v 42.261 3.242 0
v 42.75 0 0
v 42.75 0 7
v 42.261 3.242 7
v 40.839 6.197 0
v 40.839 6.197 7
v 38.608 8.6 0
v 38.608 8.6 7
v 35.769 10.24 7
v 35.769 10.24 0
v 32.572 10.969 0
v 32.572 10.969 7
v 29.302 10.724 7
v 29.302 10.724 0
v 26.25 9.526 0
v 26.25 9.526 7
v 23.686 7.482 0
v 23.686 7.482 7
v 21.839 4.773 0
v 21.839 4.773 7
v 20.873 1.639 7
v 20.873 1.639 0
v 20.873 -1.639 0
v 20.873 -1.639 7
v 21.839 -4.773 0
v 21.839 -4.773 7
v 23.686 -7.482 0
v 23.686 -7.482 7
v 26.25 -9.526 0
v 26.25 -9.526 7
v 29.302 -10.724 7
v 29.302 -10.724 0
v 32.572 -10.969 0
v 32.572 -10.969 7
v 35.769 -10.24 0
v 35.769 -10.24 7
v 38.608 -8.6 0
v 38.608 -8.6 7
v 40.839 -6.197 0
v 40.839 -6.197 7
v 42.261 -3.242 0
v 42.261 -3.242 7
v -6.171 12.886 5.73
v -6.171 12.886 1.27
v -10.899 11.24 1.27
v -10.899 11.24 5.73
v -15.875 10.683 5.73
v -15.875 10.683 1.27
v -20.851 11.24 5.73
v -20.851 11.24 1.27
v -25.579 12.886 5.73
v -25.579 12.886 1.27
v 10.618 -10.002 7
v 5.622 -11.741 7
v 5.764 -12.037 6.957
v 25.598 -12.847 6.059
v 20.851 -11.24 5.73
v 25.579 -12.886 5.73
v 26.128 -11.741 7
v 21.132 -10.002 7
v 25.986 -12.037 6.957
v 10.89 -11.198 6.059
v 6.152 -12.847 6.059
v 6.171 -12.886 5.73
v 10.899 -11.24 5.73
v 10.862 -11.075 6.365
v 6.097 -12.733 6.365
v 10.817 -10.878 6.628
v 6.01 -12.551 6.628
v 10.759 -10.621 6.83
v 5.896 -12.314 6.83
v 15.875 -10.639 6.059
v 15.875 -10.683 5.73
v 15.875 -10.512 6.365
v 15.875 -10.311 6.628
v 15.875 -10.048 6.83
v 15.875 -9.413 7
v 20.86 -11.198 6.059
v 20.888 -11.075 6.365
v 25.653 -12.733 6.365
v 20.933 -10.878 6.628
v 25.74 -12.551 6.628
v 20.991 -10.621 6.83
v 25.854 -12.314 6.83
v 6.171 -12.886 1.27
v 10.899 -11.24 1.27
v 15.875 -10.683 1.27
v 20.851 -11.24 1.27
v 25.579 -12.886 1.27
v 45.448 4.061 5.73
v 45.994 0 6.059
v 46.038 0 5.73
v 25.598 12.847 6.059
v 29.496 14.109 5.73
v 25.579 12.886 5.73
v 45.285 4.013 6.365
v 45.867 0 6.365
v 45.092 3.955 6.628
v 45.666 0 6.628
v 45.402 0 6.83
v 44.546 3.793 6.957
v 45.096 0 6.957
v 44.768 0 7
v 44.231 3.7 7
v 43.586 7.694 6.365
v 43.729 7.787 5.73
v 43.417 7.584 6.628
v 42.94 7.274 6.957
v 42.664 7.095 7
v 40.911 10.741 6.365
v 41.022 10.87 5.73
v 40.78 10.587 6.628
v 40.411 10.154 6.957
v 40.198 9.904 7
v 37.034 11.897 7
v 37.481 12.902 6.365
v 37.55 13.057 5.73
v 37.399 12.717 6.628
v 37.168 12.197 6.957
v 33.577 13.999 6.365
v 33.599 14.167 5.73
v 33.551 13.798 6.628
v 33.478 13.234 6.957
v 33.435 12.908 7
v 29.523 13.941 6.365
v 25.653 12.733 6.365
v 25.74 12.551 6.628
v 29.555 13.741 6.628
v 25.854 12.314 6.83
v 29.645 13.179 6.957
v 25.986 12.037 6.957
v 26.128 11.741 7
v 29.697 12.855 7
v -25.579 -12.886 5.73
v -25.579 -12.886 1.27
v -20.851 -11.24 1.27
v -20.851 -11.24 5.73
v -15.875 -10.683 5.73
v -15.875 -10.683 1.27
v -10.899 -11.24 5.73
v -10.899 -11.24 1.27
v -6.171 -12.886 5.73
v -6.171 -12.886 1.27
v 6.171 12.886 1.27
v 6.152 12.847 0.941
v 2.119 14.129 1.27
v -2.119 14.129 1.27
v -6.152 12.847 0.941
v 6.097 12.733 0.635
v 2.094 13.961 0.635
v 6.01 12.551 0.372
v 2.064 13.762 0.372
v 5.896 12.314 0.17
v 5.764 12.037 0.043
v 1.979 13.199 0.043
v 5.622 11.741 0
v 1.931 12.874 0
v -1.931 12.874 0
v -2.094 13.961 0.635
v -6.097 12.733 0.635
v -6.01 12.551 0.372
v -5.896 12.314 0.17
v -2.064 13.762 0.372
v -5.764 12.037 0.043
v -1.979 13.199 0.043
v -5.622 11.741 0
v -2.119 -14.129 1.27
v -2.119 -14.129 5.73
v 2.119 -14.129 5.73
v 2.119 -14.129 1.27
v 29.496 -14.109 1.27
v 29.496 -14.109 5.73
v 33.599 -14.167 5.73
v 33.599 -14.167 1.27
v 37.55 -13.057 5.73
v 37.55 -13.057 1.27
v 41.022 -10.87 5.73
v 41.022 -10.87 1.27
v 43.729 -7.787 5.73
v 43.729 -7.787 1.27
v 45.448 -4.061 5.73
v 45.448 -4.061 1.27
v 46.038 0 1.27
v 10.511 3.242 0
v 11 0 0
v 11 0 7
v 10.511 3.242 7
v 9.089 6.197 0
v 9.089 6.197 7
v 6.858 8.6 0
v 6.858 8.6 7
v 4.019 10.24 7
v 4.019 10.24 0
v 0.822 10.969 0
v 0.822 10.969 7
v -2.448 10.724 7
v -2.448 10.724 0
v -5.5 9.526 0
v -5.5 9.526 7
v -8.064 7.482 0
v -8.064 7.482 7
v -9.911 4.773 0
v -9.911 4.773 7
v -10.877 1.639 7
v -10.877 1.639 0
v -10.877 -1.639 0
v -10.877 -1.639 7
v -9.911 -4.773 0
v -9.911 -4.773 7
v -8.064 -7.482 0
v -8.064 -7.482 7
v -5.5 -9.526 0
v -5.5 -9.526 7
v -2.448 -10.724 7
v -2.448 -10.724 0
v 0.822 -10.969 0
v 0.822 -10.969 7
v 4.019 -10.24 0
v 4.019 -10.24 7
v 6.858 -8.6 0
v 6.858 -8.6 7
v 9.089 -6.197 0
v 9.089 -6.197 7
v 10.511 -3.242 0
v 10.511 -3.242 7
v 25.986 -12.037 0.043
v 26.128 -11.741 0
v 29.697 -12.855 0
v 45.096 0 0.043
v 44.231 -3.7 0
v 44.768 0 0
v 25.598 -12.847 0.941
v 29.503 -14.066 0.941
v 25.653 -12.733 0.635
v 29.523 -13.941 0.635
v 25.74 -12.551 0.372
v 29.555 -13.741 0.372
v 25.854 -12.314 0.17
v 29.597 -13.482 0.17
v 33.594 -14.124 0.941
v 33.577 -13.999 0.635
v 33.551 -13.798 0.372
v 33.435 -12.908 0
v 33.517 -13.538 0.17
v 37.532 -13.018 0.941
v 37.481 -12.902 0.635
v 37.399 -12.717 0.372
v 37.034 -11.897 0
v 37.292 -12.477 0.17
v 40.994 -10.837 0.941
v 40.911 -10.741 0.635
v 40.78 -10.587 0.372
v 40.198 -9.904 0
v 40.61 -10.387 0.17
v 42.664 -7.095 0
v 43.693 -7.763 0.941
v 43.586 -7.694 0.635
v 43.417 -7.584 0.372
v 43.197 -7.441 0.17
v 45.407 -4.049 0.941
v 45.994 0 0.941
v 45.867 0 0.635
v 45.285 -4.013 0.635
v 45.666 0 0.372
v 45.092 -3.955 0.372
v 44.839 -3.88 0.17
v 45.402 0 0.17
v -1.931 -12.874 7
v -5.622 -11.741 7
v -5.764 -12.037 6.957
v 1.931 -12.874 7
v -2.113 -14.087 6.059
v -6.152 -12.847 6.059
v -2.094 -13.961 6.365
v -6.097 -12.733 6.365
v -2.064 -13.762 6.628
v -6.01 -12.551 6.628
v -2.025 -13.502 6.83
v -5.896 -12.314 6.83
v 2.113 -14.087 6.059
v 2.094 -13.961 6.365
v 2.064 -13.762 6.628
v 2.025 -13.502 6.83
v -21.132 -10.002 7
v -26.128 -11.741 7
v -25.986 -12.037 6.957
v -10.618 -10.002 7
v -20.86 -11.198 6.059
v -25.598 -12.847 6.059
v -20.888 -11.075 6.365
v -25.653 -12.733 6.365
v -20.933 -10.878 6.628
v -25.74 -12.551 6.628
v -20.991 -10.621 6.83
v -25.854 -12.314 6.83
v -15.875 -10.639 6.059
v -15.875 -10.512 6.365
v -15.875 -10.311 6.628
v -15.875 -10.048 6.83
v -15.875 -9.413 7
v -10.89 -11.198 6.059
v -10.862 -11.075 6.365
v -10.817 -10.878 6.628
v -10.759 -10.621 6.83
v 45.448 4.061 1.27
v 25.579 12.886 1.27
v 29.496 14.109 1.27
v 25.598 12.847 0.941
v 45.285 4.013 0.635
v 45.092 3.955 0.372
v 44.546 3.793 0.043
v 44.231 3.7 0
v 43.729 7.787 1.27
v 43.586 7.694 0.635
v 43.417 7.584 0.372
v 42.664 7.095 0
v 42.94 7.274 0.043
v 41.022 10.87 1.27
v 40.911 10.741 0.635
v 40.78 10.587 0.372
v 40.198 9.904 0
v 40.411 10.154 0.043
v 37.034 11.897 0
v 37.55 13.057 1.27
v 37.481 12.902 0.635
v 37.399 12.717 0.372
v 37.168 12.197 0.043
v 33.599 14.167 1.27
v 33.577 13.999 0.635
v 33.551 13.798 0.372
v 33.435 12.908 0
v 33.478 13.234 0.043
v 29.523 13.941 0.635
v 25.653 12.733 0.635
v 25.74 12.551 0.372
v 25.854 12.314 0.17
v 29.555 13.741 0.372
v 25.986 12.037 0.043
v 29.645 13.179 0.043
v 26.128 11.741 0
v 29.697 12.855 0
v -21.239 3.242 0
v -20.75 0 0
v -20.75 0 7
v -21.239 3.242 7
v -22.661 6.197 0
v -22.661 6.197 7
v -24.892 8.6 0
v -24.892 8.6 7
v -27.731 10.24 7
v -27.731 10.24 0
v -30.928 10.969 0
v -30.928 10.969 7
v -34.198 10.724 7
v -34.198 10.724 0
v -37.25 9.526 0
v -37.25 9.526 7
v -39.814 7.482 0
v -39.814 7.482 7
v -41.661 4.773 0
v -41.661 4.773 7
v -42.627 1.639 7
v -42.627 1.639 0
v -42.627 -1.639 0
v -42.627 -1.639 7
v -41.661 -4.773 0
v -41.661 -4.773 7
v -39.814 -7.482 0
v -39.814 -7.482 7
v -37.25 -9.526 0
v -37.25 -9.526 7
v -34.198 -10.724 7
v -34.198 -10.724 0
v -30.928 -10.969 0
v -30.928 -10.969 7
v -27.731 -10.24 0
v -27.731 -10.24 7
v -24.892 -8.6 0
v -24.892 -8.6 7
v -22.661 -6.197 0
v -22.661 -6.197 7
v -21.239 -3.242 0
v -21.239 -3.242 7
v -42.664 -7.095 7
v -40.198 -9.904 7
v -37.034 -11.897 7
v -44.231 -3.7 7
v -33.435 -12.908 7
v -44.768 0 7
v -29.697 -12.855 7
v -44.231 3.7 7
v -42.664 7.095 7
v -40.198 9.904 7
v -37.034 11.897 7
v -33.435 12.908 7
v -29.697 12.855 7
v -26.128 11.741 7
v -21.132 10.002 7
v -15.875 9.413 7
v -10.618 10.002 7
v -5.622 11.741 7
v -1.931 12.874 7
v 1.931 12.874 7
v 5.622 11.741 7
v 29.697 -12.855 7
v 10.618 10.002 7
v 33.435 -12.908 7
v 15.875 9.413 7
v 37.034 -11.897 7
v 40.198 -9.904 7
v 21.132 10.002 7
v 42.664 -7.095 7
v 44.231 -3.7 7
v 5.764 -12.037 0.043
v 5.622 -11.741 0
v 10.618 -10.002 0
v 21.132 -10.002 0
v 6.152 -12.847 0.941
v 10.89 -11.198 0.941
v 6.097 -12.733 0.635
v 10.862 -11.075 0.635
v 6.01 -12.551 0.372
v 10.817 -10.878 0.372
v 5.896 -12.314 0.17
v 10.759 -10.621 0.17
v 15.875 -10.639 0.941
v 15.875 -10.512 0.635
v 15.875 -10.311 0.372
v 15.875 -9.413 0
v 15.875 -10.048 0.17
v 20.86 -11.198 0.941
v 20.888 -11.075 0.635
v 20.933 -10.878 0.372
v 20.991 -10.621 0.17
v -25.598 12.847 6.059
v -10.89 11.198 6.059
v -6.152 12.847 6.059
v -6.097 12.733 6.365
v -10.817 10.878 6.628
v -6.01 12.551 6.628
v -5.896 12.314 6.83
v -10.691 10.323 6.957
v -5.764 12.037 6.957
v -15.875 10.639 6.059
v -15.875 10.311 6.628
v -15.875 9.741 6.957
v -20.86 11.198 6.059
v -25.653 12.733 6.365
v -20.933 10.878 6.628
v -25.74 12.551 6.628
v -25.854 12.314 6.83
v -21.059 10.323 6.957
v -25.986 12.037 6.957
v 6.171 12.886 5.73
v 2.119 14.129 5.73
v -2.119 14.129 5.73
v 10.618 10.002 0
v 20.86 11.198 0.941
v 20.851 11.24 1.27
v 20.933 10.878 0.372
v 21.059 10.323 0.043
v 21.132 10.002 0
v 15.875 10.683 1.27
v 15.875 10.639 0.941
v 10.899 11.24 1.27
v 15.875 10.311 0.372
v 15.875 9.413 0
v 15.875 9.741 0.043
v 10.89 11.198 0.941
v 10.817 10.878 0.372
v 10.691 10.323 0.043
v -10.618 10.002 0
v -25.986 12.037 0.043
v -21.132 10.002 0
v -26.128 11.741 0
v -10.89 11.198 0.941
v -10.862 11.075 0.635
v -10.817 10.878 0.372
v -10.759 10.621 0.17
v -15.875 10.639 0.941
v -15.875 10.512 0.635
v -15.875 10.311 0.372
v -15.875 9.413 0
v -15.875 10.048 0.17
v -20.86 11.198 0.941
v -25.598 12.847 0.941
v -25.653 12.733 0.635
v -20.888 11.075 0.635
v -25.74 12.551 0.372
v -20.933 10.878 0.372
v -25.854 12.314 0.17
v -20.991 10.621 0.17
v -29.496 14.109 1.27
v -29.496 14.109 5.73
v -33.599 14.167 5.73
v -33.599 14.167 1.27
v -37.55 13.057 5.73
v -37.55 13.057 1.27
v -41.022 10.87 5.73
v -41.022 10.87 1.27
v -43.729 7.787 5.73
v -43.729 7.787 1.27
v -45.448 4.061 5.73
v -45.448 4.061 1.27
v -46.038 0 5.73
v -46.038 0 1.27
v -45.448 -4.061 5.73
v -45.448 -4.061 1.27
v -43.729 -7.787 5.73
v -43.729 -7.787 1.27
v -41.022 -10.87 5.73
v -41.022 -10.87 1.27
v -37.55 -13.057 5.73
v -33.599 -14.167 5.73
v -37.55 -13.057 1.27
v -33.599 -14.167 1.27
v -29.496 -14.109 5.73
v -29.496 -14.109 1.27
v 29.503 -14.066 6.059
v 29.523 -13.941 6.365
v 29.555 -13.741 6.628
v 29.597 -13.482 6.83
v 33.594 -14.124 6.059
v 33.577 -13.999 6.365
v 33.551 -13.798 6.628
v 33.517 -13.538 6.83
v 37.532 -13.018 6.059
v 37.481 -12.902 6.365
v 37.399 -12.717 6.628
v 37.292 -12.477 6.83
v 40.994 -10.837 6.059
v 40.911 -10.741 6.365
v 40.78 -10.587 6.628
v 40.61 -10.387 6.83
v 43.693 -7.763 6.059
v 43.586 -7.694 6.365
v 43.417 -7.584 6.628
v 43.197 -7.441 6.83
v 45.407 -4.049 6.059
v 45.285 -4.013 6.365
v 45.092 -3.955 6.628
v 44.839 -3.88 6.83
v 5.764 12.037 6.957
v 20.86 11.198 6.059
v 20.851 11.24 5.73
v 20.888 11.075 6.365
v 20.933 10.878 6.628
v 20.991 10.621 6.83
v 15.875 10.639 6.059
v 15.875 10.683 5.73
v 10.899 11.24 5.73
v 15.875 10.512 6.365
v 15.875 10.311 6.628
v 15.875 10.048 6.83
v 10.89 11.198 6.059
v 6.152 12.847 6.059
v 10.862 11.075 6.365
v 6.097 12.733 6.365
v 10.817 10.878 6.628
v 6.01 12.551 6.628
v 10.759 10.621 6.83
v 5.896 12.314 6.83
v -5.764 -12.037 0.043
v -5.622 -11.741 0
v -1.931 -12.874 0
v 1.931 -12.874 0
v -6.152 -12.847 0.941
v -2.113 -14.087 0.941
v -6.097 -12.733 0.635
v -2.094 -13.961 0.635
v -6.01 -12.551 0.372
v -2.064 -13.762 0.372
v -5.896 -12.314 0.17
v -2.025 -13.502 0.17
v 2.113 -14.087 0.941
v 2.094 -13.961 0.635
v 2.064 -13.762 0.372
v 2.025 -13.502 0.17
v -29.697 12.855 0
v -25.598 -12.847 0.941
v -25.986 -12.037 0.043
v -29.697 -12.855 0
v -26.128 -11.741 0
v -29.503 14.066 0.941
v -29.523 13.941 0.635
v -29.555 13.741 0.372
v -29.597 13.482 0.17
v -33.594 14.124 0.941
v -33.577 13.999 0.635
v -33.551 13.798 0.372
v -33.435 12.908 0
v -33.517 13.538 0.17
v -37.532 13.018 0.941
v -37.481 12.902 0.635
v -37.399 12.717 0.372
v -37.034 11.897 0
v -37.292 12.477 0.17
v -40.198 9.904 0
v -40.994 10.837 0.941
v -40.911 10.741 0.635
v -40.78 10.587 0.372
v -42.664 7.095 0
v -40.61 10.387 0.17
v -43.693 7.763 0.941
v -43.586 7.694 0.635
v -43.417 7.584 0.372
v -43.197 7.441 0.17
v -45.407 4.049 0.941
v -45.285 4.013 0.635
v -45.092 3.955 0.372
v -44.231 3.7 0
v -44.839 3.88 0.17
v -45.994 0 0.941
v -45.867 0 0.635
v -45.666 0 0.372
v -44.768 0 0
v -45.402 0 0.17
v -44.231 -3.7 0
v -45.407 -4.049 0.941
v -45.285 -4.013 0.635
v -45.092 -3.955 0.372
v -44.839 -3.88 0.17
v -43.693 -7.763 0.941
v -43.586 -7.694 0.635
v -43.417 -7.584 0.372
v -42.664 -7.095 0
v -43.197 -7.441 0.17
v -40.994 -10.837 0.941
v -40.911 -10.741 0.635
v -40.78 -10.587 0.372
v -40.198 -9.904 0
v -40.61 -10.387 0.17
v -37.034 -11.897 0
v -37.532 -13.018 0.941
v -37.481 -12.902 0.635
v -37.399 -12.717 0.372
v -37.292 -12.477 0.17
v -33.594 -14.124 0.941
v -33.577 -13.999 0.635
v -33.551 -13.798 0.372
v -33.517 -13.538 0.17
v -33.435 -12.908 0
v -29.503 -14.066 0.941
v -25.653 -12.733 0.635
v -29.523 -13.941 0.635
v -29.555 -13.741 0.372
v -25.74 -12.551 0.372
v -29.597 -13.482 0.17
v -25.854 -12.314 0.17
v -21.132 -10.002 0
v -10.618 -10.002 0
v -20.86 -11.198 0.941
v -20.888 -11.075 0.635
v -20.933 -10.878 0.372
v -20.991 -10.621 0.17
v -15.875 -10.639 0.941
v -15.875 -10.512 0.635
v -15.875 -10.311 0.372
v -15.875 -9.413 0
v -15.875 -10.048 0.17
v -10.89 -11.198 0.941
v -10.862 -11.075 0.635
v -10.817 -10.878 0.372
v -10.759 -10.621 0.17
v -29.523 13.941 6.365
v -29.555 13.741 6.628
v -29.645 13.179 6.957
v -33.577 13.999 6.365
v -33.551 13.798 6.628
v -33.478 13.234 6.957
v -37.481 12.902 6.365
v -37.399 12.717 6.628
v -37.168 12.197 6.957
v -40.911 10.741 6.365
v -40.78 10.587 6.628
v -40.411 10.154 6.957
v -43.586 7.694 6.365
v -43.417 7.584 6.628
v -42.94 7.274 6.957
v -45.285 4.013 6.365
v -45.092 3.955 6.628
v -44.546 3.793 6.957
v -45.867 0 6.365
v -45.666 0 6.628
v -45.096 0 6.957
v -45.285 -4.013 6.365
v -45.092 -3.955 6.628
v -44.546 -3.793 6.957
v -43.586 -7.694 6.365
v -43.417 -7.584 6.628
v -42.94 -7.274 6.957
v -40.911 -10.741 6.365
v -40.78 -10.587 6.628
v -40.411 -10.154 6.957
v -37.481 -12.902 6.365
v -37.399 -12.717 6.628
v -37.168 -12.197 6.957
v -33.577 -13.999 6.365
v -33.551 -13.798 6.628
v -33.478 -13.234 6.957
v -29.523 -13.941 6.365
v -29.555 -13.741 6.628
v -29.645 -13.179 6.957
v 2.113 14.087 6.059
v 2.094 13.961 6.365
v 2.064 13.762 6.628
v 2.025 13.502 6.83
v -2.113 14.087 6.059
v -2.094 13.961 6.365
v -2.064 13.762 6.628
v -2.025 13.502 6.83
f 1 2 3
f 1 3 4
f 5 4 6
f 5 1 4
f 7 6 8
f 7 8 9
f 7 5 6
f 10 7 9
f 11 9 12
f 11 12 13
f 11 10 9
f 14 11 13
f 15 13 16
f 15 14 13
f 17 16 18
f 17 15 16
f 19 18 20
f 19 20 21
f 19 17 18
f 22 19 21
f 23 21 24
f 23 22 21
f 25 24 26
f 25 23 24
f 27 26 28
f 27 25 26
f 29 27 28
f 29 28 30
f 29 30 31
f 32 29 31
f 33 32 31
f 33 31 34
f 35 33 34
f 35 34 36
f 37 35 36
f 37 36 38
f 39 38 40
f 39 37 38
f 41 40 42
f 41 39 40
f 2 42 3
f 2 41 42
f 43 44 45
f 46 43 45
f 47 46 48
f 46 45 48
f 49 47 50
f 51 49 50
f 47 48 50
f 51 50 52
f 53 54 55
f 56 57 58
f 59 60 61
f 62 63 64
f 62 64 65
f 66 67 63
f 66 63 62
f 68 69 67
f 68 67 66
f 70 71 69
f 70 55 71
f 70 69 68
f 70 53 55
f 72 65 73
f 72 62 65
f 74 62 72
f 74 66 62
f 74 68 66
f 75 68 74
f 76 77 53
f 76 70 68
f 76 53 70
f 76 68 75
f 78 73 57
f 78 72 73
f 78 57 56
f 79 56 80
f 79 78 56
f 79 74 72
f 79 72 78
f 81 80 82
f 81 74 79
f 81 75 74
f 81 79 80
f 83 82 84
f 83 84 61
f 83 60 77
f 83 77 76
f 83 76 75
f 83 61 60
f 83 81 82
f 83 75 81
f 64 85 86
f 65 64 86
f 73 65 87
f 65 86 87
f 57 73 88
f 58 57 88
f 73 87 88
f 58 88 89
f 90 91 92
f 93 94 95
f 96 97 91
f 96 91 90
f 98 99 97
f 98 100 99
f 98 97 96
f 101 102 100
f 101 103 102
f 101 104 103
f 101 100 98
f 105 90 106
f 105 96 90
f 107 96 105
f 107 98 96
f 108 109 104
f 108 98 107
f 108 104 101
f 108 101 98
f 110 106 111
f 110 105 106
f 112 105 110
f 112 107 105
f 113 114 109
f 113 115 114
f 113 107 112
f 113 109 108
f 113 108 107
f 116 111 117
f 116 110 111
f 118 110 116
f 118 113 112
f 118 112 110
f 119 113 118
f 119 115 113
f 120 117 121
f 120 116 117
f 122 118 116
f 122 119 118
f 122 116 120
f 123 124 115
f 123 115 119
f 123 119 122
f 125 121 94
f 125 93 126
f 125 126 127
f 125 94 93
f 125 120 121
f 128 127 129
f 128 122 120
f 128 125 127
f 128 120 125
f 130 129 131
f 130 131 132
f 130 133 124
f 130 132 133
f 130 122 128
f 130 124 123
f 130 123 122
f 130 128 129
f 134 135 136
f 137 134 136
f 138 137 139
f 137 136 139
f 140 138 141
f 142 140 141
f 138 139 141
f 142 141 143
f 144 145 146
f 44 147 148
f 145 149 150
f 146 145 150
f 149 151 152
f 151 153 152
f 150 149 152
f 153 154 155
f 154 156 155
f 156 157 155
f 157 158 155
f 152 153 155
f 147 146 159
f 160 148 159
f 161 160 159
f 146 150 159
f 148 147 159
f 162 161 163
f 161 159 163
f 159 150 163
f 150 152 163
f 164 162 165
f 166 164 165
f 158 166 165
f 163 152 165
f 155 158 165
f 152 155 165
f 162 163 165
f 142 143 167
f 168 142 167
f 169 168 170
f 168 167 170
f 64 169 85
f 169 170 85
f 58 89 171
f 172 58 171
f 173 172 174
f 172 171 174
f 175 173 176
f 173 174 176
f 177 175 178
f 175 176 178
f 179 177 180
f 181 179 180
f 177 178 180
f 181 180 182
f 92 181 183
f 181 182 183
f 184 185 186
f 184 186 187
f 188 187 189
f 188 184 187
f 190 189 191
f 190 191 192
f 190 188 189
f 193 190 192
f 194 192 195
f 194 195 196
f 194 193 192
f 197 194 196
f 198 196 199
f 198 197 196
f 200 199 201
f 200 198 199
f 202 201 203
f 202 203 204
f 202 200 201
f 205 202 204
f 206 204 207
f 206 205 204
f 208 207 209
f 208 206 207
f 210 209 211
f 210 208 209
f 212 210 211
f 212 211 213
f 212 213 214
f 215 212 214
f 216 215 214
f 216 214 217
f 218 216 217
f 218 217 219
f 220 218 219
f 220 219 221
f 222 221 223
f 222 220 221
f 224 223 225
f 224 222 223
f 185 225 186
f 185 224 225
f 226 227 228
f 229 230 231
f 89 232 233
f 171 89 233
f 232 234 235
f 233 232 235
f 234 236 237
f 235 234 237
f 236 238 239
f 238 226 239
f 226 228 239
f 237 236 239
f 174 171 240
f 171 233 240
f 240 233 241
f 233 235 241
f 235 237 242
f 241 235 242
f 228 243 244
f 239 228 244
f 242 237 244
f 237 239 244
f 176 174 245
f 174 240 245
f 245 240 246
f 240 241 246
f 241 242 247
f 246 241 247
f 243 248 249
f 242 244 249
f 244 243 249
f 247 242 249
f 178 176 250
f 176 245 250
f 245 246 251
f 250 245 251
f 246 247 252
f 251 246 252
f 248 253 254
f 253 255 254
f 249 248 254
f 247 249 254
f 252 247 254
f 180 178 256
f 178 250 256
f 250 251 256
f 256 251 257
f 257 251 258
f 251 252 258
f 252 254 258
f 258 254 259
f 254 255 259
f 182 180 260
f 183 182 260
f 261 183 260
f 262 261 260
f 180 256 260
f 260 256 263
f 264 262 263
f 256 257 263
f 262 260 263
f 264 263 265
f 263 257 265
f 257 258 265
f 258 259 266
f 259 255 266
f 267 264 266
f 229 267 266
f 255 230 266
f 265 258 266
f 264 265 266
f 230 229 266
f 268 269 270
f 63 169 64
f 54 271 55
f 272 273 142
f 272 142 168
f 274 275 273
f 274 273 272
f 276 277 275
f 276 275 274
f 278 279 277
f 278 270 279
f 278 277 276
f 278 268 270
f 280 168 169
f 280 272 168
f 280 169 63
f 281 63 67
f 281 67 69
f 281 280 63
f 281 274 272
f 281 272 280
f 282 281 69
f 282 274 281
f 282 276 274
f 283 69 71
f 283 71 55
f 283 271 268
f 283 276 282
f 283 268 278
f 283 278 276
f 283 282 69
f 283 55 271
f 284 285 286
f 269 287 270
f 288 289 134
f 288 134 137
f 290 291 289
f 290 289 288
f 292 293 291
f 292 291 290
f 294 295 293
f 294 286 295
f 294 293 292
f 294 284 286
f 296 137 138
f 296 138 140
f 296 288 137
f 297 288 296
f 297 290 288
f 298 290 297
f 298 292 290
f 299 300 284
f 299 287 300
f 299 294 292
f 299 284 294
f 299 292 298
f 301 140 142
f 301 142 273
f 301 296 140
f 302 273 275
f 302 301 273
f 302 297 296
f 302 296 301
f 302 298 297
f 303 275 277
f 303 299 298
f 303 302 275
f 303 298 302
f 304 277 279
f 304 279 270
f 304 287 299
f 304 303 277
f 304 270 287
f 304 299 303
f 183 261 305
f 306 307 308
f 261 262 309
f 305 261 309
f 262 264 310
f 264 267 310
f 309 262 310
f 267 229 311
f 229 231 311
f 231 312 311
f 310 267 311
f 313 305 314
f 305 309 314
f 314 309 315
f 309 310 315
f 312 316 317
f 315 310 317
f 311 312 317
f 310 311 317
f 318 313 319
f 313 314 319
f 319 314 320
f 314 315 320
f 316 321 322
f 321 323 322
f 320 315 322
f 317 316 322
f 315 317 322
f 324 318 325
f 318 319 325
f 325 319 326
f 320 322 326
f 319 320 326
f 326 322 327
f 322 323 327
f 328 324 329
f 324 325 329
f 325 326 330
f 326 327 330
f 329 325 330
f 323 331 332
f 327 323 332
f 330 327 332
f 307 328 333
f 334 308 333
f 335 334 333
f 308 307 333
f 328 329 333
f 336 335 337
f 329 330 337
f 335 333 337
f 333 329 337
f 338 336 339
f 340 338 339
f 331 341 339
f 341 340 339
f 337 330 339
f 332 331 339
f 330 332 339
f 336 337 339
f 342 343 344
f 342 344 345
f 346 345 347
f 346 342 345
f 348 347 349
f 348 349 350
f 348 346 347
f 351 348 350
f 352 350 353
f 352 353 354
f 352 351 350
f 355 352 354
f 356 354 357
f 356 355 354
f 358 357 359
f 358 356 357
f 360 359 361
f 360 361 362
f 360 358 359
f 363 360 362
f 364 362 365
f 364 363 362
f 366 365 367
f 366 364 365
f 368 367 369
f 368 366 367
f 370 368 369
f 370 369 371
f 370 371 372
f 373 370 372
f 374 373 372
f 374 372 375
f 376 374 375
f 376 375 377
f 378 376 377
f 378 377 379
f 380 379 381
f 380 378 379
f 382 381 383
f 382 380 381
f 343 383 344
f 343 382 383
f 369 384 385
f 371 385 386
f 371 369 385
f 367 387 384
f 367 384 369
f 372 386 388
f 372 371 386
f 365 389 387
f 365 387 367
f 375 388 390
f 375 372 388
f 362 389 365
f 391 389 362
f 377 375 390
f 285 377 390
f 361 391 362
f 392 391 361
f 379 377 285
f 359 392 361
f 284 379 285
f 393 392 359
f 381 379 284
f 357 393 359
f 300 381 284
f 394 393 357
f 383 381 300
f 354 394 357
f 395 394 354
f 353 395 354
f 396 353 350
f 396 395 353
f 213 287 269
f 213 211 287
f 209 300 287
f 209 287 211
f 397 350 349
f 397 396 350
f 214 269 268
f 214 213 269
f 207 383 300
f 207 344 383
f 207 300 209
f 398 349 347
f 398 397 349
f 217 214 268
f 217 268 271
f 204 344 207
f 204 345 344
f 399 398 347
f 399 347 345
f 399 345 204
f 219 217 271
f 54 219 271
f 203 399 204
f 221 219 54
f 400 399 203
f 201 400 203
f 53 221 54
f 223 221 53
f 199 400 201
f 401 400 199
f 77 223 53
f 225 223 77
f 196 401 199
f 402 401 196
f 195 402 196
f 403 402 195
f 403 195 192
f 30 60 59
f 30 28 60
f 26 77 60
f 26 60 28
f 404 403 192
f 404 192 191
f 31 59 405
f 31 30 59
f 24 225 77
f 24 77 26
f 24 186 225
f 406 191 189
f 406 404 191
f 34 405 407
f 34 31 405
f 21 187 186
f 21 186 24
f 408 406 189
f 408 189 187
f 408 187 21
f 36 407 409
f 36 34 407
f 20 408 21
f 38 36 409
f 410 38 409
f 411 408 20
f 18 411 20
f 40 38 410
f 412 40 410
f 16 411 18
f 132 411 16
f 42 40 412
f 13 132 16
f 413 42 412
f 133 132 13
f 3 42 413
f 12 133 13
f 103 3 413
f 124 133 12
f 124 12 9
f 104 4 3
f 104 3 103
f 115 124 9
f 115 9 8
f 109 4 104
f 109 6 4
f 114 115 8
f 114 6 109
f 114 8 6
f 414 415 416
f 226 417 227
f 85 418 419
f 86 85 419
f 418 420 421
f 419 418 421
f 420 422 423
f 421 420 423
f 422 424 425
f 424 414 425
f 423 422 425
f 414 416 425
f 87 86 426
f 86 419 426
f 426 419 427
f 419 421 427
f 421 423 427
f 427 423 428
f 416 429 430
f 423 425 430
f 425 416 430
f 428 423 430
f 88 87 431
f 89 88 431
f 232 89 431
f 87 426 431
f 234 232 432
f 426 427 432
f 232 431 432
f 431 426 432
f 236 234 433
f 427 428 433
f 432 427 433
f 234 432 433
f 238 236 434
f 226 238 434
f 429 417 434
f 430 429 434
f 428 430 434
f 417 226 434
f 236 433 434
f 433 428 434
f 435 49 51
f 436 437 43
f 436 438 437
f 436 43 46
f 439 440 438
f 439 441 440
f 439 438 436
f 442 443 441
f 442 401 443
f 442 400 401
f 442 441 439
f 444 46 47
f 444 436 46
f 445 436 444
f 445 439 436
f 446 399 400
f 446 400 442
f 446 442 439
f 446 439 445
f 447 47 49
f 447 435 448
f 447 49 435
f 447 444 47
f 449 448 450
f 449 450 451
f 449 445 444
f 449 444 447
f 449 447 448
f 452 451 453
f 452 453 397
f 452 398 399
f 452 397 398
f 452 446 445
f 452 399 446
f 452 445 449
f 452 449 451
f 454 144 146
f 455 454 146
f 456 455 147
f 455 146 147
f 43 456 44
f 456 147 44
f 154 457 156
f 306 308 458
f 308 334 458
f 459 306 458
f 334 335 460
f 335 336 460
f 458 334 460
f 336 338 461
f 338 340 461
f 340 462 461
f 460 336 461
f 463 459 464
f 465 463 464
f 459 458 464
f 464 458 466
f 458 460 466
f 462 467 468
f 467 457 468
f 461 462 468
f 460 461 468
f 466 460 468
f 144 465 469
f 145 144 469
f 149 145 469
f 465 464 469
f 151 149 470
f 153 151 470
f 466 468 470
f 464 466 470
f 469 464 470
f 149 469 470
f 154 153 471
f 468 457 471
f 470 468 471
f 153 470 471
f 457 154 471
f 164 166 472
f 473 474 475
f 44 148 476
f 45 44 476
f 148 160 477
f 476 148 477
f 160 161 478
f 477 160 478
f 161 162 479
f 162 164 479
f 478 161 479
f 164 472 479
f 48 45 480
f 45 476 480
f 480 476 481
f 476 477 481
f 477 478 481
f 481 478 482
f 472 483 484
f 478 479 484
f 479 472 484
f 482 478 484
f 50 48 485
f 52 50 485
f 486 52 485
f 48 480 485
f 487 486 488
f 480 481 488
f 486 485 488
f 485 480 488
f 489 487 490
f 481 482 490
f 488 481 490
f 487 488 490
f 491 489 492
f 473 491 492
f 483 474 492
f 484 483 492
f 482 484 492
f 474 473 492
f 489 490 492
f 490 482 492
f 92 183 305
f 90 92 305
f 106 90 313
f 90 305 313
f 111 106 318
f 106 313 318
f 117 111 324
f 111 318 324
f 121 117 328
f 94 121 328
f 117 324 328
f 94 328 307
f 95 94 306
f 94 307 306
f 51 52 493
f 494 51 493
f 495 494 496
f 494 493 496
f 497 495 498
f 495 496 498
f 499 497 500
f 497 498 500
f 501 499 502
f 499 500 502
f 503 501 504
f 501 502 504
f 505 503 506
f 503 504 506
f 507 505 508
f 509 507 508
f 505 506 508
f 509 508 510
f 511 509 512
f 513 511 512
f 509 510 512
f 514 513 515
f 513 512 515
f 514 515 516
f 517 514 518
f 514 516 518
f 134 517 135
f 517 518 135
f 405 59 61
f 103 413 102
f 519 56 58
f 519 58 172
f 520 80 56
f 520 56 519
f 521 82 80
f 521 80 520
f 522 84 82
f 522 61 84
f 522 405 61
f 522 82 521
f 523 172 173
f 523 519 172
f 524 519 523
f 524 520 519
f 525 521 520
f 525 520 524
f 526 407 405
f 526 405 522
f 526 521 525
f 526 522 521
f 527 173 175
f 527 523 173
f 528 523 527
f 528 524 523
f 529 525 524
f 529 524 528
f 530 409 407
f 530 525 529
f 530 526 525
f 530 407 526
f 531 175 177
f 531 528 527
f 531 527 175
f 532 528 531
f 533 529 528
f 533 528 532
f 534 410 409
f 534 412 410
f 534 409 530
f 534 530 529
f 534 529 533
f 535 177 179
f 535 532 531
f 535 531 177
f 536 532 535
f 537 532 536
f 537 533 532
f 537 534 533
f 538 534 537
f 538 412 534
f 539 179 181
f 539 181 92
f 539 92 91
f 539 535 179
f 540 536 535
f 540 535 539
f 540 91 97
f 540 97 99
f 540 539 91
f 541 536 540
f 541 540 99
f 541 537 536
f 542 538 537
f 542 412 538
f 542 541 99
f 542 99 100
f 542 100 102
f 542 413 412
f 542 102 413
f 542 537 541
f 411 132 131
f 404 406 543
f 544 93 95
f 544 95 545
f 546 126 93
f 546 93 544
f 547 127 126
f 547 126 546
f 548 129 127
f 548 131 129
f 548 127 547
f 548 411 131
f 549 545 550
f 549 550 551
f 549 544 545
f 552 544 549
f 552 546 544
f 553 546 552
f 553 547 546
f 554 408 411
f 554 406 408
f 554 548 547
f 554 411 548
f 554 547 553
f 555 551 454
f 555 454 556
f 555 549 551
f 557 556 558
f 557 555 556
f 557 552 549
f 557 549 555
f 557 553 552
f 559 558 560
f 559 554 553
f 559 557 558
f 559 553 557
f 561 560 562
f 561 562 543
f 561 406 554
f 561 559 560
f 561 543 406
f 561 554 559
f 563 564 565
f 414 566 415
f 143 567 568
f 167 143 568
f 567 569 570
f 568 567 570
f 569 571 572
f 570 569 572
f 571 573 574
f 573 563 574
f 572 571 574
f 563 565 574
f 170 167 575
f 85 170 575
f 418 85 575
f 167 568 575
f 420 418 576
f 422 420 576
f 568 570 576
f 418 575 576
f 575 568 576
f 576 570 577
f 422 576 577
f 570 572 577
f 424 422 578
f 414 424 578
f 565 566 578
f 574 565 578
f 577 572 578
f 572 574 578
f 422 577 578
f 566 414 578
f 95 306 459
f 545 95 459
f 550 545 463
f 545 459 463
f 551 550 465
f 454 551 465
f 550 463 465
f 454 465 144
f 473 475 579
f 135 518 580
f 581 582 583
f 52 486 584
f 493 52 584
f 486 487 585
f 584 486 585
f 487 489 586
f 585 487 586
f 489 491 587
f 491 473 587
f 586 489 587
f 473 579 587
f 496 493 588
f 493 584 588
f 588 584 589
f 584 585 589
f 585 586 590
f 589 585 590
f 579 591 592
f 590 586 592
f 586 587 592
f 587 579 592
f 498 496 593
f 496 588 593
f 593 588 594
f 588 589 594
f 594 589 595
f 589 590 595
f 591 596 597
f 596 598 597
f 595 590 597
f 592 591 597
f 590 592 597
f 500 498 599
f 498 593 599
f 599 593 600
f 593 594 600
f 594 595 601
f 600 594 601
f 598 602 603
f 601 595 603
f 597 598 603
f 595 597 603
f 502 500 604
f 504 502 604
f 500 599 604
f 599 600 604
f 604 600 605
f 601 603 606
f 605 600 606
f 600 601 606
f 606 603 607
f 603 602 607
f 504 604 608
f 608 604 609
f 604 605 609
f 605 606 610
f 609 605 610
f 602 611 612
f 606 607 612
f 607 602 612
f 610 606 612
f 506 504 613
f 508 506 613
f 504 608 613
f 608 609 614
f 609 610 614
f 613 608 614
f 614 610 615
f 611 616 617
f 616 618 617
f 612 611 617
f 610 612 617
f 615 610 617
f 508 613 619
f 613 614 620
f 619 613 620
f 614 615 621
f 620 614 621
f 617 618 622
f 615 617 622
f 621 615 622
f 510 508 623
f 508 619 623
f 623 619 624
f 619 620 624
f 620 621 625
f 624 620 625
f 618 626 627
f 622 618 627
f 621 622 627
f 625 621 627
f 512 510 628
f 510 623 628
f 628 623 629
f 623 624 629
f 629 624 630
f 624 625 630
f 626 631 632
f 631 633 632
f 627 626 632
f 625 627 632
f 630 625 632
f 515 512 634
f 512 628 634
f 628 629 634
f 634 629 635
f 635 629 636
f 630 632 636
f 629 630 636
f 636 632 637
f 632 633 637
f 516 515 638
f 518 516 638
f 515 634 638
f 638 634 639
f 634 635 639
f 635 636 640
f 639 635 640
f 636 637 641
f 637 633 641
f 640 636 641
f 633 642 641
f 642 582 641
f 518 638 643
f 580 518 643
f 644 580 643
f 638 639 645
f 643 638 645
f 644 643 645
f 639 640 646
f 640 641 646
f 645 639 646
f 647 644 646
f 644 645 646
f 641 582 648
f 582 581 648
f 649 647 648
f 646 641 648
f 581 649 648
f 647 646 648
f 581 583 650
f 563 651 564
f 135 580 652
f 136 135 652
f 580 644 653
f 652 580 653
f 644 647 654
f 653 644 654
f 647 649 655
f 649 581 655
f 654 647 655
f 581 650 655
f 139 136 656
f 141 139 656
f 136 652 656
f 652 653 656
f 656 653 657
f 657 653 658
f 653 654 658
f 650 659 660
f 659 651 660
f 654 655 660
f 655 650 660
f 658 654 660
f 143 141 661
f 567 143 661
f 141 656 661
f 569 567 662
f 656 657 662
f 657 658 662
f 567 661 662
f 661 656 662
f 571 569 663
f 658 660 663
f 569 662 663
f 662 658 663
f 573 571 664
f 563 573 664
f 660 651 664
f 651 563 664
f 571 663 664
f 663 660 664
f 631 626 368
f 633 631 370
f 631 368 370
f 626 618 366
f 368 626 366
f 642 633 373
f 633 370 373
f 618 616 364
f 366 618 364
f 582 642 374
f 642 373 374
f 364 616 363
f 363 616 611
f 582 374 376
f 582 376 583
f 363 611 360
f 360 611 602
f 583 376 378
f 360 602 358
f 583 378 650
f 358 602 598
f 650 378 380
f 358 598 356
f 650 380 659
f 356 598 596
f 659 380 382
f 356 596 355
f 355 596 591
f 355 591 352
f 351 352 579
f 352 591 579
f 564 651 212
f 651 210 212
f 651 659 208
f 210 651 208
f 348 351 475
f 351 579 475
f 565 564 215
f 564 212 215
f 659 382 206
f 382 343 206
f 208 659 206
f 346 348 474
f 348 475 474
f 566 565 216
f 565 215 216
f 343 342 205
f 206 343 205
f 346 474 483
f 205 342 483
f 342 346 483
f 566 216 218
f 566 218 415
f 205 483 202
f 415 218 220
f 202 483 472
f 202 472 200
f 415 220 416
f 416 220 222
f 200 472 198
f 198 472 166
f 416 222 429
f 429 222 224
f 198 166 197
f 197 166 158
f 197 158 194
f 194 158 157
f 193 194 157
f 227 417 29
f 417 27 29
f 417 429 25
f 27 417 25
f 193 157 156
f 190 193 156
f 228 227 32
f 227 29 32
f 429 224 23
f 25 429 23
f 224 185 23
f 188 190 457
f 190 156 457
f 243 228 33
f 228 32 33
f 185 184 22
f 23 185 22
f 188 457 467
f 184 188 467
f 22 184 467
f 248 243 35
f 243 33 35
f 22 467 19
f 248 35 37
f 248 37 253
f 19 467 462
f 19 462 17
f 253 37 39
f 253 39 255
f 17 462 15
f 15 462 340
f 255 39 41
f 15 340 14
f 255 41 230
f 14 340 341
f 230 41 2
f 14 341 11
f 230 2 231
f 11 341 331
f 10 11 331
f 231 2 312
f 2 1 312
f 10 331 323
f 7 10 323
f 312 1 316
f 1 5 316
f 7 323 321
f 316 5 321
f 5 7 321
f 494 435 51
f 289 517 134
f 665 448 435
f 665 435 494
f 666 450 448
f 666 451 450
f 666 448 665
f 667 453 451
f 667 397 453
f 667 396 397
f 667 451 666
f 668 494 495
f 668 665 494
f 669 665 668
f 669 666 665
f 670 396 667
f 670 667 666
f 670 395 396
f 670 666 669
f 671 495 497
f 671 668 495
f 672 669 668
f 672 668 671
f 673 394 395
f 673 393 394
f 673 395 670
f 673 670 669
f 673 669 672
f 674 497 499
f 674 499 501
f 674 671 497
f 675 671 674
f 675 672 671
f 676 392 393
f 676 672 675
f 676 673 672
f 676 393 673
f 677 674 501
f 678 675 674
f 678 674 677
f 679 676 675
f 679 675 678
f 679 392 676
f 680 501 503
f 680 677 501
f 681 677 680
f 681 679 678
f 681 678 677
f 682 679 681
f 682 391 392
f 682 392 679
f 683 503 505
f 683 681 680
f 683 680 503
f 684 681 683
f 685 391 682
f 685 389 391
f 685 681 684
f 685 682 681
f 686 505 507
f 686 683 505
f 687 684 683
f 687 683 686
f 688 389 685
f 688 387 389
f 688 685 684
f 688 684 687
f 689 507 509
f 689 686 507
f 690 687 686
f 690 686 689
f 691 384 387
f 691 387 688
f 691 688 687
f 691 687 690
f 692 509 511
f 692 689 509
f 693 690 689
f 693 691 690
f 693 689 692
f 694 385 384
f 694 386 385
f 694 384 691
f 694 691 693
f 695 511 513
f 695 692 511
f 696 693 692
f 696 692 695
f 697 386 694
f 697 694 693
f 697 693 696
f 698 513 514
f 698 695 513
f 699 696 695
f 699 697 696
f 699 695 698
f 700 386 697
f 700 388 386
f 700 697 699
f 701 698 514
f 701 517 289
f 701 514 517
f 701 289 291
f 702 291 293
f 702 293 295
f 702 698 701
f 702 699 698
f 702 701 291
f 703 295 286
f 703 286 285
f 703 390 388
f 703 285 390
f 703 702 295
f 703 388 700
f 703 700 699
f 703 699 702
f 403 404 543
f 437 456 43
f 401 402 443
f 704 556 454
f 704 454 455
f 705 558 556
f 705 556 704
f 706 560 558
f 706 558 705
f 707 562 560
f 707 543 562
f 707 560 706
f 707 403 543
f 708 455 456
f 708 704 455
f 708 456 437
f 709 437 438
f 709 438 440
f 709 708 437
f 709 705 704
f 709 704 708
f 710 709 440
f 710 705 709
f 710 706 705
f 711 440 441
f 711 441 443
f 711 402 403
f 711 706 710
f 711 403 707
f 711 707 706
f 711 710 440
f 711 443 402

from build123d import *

# Parameters (mm, degrees)
F0_R     = 11
F1_DEPTH = 7
F2_R     = 1.27


with BuildPart() as f1:
    # F0 (on Top) → F1 (new body)
    with BuildSketch(Plane.XY):
        with BuildLine():
            ThreePointArc((6.1706337368, -12.8862692637), (12.0891601396, -7.6147792724), (14.2875, 0))
            ThreePointArc((14.2875, 0), (12.0891601396, 7.6147792724), (6.1706337368, 12.8862692637))
            ThreePointArc((6.1706337368, 12.8862692637), (0, 14.2875), (-6.1706337368, 12.8862692637))
            ThreePointArc((-6.1706337368, 12.8862692637), (-14.2875, 0), (-6.1706337368, -12.8862692637))
            ThreePointArc((-6.1706337368, -12.8862692637), (0, -14.2875), (6.1706337368, -12.8862692637))
        make_face()
        Circle(F0_R, mode=Mode.SUBTRACT)
        with BuildLine():
            ThreePointArc((6.1706337368, 12.8862692637), (12.0891601396, 7.6147792724), (14.2875, 0))
            ThreePointArc((14.2875, 0), (12.0891601396, -7.6147792724), (6.1706337368, -12.8862692637))
            ThreePointArc((6.1706337368, -12.8862692637), (15.875, -10.6825966971), (25.5793662632, -12.8862692637))
            ThreePointArc((25.5793662632, -12.8862692637), (17.4625, 0), (25.5793662632, 12.8862692637))
            ThreePointArc((25.5793662632, 12.8862692637), (15.875, 10.6825966971), (6.1706337368, 12.8862692637))
        make_face()
        with BuildLine():
            ThreePointArc((-6.1706337368, -12.8862692637), (-14.2875, 0), (-6.1706337368, 12.8862692637))
            ThreePointArc((-6.1706337368, 12.8862692637), (-15.875, 10.6825966971), (-25.5793662632, 12.8862692637))
            ThreePointArc((-25.5793662632, 12.8862692637), (-19.6608398604, 7.6147792724), (-17.4625, 0))
            ThreePointArc((-17.4625, 0), (-19.6608398604, -7.6147792724), (-25.5793662632, -12.8862692637))
            ThreePointArc((-25.5793662632, -12.8862692637), (-15.875, -10.6825966971), (-6.1706337368, -12.8862692637))
        make_face()
        with BuildLine():
            ThreePointArc((46.0375, 0), (39.3647792724, 12.0891601396), (25.5793662632, 12.8862692637))
            ThreePointArc((25.5793662632, 12.8862692637), (17.4625, 0), (25.5793662632, -12.8862692637))
            ThreePointArc((25.5793662632, -12.8862692637), (39.3647792724, -12.0891601396), (46.0375, 0))
        make_face()
        with Locations((31.75, 0)):
            Circle(F0_R, mode=Mode.SUBTRACT)
        with BuildLine():
            ThreePointArc((-17.4625, 0), (-19.6608398604, 7.6147792724), (-25.5793662632, 12.8862692637))
            ThreePointArc((-25.5793662632, 12.8862692637), (-46.0375, 0), (-25.5793662632, -12.8862692637))
            ThreePointArc((-25.5793662632, -12.8862692637), (-19.6608398604, -7.6147792724), (-17.4625, 0))
        make_face()
        with Locations((-31.75, 0)):
            Circle(F0_R, mode=Mode.SUBTRACT)
    extrude(amount=F1_DEPTH)

    # F2
    f2_edges = [f1.edges().sort_by_distance(p)[0] for p in [
        (-46.0375, 0, 7),
        (0, 14.2875, 0),
    ]]
    fillet(f2_edges, radius=F2_R)


solid = f1.part
